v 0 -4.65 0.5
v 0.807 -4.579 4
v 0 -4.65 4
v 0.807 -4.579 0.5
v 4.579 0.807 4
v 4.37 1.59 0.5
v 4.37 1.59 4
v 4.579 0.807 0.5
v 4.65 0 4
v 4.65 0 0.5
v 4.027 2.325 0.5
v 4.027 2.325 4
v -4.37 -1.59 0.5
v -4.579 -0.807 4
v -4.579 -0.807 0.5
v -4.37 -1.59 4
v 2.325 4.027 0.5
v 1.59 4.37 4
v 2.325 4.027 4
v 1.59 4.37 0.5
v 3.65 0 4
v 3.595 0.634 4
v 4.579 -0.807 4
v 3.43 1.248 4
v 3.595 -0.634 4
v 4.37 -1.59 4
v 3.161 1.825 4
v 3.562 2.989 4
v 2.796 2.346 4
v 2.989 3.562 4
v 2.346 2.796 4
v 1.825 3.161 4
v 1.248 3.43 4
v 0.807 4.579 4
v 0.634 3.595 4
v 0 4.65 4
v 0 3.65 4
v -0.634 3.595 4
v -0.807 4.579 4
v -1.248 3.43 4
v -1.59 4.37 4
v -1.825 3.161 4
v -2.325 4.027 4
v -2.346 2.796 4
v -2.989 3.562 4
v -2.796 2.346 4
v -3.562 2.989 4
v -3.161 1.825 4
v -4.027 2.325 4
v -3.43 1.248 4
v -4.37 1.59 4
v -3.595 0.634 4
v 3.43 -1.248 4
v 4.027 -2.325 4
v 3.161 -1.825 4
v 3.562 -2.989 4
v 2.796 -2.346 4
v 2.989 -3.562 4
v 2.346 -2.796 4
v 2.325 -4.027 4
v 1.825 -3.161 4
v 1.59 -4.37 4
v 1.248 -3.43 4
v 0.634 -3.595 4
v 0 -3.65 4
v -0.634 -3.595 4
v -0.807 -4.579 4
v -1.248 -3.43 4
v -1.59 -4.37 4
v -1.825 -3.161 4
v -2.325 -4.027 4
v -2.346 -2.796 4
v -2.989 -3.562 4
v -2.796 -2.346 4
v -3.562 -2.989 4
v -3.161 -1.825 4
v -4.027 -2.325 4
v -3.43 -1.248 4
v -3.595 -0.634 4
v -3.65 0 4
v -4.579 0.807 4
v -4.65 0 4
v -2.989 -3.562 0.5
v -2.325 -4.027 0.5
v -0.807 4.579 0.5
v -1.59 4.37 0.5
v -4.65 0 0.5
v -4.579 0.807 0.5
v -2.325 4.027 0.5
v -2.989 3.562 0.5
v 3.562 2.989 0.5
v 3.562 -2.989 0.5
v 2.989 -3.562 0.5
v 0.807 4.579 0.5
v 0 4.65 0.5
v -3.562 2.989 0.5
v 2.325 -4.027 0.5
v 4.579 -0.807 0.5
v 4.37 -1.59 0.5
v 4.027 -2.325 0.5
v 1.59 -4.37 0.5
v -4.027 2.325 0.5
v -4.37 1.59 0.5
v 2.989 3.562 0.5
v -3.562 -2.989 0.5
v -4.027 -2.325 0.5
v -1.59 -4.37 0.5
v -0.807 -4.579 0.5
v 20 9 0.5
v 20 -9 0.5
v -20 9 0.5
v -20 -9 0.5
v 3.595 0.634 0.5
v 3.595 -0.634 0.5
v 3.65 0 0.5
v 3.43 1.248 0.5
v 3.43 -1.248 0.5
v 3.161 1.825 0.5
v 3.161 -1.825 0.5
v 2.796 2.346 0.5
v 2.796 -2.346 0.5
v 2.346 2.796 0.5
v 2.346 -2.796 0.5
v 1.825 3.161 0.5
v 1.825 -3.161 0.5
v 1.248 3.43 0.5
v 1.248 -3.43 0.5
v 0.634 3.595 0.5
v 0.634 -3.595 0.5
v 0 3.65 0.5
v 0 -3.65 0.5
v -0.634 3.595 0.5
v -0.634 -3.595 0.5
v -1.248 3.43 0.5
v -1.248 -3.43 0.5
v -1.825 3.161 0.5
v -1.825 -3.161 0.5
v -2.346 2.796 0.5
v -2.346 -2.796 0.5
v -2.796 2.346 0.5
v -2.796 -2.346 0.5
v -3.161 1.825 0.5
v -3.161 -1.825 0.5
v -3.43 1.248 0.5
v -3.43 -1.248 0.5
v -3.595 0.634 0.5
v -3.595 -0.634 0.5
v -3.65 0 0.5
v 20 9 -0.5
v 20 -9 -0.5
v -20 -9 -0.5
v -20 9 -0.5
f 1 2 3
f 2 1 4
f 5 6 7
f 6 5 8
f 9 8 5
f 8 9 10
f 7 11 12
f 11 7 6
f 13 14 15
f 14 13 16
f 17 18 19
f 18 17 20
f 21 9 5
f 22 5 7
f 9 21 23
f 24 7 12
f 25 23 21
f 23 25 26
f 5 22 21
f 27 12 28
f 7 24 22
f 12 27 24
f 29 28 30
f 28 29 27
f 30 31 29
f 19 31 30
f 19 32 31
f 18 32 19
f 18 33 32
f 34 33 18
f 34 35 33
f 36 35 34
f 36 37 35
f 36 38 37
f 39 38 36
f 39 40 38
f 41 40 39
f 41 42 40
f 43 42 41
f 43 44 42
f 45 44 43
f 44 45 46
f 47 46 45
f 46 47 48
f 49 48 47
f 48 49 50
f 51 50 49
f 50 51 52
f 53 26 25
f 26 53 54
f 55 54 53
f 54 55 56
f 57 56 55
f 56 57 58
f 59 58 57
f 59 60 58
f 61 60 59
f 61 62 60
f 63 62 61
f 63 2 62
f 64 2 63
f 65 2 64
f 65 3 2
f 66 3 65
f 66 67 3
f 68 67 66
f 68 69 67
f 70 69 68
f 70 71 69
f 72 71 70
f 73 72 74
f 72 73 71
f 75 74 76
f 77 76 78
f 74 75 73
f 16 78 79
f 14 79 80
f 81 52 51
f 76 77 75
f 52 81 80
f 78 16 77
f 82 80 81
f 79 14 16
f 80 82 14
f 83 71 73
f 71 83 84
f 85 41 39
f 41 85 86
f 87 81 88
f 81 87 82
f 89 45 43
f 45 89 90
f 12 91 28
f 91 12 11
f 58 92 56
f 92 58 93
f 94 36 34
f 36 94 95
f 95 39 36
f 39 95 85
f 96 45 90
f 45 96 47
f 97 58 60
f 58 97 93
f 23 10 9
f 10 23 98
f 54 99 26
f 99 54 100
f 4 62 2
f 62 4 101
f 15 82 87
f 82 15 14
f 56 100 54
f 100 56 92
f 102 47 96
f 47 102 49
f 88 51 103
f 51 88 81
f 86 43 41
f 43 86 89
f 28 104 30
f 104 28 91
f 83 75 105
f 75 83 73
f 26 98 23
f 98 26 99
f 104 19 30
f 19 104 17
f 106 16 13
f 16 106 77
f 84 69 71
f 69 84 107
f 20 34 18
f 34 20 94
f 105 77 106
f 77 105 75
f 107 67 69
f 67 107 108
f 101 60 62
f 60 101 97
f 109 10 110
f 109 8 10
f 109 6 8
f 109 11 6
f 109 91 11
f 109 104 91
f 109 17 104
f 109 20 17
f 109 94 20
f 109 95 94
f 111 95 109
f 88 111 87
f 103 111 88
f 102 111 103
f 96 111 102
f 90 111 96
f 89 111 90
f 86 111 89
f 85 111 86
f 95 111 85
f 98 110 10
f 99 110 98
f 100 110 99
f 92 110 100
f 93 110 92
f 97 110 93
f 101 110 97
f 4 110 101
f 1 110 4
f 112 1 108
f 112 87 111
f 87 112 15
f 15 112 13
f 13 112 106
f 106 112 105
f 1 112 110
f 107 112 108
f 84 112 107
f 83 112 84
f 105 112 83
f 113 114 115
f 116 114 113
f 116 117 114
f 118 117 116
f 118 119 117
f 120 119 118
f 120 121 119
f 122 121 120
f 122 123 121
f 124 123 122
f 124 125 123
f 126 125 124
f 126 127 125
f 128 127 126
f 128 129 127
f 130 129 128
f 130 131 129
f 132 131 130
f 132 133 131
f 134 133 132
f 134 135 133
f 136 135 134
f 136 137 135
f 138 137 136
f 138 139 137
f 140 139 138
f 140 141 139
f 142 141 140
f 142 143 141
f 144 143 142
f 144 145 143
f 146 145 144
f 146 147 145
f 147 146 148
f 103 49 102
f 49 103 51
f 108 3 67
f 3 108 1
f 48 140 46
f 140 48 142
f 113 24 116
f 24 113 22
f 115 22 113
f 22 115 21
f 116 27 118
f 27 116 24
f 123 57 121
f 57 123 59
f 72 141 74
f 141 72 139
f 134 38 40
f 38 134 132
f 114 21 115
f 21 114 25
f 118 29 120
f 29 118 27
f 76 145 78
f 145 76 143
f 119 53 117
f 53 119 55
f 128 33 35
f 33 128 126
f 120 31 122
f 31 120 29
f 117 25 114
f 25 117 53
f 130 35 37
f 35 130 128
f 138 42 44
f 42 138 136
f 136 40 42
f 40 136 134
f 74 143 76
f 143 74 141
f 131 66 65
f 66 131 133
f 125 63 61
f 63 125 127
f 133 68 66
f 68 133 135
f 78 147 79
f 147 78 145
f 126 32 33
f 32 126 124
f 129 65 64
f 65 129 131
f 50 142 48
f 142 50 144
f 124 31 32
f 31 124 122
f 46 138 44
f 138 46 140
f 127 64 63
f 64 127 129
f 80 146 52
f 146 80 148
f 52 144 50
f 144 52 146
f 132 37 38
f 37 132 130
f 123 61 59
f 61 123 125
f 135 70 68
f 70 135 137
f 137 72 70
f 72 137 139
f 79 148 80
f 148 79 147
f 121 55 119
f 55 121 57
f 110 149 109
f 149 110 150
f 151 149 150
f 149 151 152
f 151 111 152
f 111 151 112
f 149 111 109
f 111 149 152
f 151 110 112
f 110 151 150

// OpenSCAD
basex = 40;
basez  = 1;
basey  = 18;

shaftd  = 7.3;
shafth  = 3.5;


cube([basex, basey, basez], center=true);
translate([0, 0, (basez + shafth)/2]) {
  difference () {
      cylinder(h=shafth, d=shaftd+2, $fn = 36, center = true);
      cylinder(h=shafth, d=shaftd, $fn = 36, center=true);
  }
}
